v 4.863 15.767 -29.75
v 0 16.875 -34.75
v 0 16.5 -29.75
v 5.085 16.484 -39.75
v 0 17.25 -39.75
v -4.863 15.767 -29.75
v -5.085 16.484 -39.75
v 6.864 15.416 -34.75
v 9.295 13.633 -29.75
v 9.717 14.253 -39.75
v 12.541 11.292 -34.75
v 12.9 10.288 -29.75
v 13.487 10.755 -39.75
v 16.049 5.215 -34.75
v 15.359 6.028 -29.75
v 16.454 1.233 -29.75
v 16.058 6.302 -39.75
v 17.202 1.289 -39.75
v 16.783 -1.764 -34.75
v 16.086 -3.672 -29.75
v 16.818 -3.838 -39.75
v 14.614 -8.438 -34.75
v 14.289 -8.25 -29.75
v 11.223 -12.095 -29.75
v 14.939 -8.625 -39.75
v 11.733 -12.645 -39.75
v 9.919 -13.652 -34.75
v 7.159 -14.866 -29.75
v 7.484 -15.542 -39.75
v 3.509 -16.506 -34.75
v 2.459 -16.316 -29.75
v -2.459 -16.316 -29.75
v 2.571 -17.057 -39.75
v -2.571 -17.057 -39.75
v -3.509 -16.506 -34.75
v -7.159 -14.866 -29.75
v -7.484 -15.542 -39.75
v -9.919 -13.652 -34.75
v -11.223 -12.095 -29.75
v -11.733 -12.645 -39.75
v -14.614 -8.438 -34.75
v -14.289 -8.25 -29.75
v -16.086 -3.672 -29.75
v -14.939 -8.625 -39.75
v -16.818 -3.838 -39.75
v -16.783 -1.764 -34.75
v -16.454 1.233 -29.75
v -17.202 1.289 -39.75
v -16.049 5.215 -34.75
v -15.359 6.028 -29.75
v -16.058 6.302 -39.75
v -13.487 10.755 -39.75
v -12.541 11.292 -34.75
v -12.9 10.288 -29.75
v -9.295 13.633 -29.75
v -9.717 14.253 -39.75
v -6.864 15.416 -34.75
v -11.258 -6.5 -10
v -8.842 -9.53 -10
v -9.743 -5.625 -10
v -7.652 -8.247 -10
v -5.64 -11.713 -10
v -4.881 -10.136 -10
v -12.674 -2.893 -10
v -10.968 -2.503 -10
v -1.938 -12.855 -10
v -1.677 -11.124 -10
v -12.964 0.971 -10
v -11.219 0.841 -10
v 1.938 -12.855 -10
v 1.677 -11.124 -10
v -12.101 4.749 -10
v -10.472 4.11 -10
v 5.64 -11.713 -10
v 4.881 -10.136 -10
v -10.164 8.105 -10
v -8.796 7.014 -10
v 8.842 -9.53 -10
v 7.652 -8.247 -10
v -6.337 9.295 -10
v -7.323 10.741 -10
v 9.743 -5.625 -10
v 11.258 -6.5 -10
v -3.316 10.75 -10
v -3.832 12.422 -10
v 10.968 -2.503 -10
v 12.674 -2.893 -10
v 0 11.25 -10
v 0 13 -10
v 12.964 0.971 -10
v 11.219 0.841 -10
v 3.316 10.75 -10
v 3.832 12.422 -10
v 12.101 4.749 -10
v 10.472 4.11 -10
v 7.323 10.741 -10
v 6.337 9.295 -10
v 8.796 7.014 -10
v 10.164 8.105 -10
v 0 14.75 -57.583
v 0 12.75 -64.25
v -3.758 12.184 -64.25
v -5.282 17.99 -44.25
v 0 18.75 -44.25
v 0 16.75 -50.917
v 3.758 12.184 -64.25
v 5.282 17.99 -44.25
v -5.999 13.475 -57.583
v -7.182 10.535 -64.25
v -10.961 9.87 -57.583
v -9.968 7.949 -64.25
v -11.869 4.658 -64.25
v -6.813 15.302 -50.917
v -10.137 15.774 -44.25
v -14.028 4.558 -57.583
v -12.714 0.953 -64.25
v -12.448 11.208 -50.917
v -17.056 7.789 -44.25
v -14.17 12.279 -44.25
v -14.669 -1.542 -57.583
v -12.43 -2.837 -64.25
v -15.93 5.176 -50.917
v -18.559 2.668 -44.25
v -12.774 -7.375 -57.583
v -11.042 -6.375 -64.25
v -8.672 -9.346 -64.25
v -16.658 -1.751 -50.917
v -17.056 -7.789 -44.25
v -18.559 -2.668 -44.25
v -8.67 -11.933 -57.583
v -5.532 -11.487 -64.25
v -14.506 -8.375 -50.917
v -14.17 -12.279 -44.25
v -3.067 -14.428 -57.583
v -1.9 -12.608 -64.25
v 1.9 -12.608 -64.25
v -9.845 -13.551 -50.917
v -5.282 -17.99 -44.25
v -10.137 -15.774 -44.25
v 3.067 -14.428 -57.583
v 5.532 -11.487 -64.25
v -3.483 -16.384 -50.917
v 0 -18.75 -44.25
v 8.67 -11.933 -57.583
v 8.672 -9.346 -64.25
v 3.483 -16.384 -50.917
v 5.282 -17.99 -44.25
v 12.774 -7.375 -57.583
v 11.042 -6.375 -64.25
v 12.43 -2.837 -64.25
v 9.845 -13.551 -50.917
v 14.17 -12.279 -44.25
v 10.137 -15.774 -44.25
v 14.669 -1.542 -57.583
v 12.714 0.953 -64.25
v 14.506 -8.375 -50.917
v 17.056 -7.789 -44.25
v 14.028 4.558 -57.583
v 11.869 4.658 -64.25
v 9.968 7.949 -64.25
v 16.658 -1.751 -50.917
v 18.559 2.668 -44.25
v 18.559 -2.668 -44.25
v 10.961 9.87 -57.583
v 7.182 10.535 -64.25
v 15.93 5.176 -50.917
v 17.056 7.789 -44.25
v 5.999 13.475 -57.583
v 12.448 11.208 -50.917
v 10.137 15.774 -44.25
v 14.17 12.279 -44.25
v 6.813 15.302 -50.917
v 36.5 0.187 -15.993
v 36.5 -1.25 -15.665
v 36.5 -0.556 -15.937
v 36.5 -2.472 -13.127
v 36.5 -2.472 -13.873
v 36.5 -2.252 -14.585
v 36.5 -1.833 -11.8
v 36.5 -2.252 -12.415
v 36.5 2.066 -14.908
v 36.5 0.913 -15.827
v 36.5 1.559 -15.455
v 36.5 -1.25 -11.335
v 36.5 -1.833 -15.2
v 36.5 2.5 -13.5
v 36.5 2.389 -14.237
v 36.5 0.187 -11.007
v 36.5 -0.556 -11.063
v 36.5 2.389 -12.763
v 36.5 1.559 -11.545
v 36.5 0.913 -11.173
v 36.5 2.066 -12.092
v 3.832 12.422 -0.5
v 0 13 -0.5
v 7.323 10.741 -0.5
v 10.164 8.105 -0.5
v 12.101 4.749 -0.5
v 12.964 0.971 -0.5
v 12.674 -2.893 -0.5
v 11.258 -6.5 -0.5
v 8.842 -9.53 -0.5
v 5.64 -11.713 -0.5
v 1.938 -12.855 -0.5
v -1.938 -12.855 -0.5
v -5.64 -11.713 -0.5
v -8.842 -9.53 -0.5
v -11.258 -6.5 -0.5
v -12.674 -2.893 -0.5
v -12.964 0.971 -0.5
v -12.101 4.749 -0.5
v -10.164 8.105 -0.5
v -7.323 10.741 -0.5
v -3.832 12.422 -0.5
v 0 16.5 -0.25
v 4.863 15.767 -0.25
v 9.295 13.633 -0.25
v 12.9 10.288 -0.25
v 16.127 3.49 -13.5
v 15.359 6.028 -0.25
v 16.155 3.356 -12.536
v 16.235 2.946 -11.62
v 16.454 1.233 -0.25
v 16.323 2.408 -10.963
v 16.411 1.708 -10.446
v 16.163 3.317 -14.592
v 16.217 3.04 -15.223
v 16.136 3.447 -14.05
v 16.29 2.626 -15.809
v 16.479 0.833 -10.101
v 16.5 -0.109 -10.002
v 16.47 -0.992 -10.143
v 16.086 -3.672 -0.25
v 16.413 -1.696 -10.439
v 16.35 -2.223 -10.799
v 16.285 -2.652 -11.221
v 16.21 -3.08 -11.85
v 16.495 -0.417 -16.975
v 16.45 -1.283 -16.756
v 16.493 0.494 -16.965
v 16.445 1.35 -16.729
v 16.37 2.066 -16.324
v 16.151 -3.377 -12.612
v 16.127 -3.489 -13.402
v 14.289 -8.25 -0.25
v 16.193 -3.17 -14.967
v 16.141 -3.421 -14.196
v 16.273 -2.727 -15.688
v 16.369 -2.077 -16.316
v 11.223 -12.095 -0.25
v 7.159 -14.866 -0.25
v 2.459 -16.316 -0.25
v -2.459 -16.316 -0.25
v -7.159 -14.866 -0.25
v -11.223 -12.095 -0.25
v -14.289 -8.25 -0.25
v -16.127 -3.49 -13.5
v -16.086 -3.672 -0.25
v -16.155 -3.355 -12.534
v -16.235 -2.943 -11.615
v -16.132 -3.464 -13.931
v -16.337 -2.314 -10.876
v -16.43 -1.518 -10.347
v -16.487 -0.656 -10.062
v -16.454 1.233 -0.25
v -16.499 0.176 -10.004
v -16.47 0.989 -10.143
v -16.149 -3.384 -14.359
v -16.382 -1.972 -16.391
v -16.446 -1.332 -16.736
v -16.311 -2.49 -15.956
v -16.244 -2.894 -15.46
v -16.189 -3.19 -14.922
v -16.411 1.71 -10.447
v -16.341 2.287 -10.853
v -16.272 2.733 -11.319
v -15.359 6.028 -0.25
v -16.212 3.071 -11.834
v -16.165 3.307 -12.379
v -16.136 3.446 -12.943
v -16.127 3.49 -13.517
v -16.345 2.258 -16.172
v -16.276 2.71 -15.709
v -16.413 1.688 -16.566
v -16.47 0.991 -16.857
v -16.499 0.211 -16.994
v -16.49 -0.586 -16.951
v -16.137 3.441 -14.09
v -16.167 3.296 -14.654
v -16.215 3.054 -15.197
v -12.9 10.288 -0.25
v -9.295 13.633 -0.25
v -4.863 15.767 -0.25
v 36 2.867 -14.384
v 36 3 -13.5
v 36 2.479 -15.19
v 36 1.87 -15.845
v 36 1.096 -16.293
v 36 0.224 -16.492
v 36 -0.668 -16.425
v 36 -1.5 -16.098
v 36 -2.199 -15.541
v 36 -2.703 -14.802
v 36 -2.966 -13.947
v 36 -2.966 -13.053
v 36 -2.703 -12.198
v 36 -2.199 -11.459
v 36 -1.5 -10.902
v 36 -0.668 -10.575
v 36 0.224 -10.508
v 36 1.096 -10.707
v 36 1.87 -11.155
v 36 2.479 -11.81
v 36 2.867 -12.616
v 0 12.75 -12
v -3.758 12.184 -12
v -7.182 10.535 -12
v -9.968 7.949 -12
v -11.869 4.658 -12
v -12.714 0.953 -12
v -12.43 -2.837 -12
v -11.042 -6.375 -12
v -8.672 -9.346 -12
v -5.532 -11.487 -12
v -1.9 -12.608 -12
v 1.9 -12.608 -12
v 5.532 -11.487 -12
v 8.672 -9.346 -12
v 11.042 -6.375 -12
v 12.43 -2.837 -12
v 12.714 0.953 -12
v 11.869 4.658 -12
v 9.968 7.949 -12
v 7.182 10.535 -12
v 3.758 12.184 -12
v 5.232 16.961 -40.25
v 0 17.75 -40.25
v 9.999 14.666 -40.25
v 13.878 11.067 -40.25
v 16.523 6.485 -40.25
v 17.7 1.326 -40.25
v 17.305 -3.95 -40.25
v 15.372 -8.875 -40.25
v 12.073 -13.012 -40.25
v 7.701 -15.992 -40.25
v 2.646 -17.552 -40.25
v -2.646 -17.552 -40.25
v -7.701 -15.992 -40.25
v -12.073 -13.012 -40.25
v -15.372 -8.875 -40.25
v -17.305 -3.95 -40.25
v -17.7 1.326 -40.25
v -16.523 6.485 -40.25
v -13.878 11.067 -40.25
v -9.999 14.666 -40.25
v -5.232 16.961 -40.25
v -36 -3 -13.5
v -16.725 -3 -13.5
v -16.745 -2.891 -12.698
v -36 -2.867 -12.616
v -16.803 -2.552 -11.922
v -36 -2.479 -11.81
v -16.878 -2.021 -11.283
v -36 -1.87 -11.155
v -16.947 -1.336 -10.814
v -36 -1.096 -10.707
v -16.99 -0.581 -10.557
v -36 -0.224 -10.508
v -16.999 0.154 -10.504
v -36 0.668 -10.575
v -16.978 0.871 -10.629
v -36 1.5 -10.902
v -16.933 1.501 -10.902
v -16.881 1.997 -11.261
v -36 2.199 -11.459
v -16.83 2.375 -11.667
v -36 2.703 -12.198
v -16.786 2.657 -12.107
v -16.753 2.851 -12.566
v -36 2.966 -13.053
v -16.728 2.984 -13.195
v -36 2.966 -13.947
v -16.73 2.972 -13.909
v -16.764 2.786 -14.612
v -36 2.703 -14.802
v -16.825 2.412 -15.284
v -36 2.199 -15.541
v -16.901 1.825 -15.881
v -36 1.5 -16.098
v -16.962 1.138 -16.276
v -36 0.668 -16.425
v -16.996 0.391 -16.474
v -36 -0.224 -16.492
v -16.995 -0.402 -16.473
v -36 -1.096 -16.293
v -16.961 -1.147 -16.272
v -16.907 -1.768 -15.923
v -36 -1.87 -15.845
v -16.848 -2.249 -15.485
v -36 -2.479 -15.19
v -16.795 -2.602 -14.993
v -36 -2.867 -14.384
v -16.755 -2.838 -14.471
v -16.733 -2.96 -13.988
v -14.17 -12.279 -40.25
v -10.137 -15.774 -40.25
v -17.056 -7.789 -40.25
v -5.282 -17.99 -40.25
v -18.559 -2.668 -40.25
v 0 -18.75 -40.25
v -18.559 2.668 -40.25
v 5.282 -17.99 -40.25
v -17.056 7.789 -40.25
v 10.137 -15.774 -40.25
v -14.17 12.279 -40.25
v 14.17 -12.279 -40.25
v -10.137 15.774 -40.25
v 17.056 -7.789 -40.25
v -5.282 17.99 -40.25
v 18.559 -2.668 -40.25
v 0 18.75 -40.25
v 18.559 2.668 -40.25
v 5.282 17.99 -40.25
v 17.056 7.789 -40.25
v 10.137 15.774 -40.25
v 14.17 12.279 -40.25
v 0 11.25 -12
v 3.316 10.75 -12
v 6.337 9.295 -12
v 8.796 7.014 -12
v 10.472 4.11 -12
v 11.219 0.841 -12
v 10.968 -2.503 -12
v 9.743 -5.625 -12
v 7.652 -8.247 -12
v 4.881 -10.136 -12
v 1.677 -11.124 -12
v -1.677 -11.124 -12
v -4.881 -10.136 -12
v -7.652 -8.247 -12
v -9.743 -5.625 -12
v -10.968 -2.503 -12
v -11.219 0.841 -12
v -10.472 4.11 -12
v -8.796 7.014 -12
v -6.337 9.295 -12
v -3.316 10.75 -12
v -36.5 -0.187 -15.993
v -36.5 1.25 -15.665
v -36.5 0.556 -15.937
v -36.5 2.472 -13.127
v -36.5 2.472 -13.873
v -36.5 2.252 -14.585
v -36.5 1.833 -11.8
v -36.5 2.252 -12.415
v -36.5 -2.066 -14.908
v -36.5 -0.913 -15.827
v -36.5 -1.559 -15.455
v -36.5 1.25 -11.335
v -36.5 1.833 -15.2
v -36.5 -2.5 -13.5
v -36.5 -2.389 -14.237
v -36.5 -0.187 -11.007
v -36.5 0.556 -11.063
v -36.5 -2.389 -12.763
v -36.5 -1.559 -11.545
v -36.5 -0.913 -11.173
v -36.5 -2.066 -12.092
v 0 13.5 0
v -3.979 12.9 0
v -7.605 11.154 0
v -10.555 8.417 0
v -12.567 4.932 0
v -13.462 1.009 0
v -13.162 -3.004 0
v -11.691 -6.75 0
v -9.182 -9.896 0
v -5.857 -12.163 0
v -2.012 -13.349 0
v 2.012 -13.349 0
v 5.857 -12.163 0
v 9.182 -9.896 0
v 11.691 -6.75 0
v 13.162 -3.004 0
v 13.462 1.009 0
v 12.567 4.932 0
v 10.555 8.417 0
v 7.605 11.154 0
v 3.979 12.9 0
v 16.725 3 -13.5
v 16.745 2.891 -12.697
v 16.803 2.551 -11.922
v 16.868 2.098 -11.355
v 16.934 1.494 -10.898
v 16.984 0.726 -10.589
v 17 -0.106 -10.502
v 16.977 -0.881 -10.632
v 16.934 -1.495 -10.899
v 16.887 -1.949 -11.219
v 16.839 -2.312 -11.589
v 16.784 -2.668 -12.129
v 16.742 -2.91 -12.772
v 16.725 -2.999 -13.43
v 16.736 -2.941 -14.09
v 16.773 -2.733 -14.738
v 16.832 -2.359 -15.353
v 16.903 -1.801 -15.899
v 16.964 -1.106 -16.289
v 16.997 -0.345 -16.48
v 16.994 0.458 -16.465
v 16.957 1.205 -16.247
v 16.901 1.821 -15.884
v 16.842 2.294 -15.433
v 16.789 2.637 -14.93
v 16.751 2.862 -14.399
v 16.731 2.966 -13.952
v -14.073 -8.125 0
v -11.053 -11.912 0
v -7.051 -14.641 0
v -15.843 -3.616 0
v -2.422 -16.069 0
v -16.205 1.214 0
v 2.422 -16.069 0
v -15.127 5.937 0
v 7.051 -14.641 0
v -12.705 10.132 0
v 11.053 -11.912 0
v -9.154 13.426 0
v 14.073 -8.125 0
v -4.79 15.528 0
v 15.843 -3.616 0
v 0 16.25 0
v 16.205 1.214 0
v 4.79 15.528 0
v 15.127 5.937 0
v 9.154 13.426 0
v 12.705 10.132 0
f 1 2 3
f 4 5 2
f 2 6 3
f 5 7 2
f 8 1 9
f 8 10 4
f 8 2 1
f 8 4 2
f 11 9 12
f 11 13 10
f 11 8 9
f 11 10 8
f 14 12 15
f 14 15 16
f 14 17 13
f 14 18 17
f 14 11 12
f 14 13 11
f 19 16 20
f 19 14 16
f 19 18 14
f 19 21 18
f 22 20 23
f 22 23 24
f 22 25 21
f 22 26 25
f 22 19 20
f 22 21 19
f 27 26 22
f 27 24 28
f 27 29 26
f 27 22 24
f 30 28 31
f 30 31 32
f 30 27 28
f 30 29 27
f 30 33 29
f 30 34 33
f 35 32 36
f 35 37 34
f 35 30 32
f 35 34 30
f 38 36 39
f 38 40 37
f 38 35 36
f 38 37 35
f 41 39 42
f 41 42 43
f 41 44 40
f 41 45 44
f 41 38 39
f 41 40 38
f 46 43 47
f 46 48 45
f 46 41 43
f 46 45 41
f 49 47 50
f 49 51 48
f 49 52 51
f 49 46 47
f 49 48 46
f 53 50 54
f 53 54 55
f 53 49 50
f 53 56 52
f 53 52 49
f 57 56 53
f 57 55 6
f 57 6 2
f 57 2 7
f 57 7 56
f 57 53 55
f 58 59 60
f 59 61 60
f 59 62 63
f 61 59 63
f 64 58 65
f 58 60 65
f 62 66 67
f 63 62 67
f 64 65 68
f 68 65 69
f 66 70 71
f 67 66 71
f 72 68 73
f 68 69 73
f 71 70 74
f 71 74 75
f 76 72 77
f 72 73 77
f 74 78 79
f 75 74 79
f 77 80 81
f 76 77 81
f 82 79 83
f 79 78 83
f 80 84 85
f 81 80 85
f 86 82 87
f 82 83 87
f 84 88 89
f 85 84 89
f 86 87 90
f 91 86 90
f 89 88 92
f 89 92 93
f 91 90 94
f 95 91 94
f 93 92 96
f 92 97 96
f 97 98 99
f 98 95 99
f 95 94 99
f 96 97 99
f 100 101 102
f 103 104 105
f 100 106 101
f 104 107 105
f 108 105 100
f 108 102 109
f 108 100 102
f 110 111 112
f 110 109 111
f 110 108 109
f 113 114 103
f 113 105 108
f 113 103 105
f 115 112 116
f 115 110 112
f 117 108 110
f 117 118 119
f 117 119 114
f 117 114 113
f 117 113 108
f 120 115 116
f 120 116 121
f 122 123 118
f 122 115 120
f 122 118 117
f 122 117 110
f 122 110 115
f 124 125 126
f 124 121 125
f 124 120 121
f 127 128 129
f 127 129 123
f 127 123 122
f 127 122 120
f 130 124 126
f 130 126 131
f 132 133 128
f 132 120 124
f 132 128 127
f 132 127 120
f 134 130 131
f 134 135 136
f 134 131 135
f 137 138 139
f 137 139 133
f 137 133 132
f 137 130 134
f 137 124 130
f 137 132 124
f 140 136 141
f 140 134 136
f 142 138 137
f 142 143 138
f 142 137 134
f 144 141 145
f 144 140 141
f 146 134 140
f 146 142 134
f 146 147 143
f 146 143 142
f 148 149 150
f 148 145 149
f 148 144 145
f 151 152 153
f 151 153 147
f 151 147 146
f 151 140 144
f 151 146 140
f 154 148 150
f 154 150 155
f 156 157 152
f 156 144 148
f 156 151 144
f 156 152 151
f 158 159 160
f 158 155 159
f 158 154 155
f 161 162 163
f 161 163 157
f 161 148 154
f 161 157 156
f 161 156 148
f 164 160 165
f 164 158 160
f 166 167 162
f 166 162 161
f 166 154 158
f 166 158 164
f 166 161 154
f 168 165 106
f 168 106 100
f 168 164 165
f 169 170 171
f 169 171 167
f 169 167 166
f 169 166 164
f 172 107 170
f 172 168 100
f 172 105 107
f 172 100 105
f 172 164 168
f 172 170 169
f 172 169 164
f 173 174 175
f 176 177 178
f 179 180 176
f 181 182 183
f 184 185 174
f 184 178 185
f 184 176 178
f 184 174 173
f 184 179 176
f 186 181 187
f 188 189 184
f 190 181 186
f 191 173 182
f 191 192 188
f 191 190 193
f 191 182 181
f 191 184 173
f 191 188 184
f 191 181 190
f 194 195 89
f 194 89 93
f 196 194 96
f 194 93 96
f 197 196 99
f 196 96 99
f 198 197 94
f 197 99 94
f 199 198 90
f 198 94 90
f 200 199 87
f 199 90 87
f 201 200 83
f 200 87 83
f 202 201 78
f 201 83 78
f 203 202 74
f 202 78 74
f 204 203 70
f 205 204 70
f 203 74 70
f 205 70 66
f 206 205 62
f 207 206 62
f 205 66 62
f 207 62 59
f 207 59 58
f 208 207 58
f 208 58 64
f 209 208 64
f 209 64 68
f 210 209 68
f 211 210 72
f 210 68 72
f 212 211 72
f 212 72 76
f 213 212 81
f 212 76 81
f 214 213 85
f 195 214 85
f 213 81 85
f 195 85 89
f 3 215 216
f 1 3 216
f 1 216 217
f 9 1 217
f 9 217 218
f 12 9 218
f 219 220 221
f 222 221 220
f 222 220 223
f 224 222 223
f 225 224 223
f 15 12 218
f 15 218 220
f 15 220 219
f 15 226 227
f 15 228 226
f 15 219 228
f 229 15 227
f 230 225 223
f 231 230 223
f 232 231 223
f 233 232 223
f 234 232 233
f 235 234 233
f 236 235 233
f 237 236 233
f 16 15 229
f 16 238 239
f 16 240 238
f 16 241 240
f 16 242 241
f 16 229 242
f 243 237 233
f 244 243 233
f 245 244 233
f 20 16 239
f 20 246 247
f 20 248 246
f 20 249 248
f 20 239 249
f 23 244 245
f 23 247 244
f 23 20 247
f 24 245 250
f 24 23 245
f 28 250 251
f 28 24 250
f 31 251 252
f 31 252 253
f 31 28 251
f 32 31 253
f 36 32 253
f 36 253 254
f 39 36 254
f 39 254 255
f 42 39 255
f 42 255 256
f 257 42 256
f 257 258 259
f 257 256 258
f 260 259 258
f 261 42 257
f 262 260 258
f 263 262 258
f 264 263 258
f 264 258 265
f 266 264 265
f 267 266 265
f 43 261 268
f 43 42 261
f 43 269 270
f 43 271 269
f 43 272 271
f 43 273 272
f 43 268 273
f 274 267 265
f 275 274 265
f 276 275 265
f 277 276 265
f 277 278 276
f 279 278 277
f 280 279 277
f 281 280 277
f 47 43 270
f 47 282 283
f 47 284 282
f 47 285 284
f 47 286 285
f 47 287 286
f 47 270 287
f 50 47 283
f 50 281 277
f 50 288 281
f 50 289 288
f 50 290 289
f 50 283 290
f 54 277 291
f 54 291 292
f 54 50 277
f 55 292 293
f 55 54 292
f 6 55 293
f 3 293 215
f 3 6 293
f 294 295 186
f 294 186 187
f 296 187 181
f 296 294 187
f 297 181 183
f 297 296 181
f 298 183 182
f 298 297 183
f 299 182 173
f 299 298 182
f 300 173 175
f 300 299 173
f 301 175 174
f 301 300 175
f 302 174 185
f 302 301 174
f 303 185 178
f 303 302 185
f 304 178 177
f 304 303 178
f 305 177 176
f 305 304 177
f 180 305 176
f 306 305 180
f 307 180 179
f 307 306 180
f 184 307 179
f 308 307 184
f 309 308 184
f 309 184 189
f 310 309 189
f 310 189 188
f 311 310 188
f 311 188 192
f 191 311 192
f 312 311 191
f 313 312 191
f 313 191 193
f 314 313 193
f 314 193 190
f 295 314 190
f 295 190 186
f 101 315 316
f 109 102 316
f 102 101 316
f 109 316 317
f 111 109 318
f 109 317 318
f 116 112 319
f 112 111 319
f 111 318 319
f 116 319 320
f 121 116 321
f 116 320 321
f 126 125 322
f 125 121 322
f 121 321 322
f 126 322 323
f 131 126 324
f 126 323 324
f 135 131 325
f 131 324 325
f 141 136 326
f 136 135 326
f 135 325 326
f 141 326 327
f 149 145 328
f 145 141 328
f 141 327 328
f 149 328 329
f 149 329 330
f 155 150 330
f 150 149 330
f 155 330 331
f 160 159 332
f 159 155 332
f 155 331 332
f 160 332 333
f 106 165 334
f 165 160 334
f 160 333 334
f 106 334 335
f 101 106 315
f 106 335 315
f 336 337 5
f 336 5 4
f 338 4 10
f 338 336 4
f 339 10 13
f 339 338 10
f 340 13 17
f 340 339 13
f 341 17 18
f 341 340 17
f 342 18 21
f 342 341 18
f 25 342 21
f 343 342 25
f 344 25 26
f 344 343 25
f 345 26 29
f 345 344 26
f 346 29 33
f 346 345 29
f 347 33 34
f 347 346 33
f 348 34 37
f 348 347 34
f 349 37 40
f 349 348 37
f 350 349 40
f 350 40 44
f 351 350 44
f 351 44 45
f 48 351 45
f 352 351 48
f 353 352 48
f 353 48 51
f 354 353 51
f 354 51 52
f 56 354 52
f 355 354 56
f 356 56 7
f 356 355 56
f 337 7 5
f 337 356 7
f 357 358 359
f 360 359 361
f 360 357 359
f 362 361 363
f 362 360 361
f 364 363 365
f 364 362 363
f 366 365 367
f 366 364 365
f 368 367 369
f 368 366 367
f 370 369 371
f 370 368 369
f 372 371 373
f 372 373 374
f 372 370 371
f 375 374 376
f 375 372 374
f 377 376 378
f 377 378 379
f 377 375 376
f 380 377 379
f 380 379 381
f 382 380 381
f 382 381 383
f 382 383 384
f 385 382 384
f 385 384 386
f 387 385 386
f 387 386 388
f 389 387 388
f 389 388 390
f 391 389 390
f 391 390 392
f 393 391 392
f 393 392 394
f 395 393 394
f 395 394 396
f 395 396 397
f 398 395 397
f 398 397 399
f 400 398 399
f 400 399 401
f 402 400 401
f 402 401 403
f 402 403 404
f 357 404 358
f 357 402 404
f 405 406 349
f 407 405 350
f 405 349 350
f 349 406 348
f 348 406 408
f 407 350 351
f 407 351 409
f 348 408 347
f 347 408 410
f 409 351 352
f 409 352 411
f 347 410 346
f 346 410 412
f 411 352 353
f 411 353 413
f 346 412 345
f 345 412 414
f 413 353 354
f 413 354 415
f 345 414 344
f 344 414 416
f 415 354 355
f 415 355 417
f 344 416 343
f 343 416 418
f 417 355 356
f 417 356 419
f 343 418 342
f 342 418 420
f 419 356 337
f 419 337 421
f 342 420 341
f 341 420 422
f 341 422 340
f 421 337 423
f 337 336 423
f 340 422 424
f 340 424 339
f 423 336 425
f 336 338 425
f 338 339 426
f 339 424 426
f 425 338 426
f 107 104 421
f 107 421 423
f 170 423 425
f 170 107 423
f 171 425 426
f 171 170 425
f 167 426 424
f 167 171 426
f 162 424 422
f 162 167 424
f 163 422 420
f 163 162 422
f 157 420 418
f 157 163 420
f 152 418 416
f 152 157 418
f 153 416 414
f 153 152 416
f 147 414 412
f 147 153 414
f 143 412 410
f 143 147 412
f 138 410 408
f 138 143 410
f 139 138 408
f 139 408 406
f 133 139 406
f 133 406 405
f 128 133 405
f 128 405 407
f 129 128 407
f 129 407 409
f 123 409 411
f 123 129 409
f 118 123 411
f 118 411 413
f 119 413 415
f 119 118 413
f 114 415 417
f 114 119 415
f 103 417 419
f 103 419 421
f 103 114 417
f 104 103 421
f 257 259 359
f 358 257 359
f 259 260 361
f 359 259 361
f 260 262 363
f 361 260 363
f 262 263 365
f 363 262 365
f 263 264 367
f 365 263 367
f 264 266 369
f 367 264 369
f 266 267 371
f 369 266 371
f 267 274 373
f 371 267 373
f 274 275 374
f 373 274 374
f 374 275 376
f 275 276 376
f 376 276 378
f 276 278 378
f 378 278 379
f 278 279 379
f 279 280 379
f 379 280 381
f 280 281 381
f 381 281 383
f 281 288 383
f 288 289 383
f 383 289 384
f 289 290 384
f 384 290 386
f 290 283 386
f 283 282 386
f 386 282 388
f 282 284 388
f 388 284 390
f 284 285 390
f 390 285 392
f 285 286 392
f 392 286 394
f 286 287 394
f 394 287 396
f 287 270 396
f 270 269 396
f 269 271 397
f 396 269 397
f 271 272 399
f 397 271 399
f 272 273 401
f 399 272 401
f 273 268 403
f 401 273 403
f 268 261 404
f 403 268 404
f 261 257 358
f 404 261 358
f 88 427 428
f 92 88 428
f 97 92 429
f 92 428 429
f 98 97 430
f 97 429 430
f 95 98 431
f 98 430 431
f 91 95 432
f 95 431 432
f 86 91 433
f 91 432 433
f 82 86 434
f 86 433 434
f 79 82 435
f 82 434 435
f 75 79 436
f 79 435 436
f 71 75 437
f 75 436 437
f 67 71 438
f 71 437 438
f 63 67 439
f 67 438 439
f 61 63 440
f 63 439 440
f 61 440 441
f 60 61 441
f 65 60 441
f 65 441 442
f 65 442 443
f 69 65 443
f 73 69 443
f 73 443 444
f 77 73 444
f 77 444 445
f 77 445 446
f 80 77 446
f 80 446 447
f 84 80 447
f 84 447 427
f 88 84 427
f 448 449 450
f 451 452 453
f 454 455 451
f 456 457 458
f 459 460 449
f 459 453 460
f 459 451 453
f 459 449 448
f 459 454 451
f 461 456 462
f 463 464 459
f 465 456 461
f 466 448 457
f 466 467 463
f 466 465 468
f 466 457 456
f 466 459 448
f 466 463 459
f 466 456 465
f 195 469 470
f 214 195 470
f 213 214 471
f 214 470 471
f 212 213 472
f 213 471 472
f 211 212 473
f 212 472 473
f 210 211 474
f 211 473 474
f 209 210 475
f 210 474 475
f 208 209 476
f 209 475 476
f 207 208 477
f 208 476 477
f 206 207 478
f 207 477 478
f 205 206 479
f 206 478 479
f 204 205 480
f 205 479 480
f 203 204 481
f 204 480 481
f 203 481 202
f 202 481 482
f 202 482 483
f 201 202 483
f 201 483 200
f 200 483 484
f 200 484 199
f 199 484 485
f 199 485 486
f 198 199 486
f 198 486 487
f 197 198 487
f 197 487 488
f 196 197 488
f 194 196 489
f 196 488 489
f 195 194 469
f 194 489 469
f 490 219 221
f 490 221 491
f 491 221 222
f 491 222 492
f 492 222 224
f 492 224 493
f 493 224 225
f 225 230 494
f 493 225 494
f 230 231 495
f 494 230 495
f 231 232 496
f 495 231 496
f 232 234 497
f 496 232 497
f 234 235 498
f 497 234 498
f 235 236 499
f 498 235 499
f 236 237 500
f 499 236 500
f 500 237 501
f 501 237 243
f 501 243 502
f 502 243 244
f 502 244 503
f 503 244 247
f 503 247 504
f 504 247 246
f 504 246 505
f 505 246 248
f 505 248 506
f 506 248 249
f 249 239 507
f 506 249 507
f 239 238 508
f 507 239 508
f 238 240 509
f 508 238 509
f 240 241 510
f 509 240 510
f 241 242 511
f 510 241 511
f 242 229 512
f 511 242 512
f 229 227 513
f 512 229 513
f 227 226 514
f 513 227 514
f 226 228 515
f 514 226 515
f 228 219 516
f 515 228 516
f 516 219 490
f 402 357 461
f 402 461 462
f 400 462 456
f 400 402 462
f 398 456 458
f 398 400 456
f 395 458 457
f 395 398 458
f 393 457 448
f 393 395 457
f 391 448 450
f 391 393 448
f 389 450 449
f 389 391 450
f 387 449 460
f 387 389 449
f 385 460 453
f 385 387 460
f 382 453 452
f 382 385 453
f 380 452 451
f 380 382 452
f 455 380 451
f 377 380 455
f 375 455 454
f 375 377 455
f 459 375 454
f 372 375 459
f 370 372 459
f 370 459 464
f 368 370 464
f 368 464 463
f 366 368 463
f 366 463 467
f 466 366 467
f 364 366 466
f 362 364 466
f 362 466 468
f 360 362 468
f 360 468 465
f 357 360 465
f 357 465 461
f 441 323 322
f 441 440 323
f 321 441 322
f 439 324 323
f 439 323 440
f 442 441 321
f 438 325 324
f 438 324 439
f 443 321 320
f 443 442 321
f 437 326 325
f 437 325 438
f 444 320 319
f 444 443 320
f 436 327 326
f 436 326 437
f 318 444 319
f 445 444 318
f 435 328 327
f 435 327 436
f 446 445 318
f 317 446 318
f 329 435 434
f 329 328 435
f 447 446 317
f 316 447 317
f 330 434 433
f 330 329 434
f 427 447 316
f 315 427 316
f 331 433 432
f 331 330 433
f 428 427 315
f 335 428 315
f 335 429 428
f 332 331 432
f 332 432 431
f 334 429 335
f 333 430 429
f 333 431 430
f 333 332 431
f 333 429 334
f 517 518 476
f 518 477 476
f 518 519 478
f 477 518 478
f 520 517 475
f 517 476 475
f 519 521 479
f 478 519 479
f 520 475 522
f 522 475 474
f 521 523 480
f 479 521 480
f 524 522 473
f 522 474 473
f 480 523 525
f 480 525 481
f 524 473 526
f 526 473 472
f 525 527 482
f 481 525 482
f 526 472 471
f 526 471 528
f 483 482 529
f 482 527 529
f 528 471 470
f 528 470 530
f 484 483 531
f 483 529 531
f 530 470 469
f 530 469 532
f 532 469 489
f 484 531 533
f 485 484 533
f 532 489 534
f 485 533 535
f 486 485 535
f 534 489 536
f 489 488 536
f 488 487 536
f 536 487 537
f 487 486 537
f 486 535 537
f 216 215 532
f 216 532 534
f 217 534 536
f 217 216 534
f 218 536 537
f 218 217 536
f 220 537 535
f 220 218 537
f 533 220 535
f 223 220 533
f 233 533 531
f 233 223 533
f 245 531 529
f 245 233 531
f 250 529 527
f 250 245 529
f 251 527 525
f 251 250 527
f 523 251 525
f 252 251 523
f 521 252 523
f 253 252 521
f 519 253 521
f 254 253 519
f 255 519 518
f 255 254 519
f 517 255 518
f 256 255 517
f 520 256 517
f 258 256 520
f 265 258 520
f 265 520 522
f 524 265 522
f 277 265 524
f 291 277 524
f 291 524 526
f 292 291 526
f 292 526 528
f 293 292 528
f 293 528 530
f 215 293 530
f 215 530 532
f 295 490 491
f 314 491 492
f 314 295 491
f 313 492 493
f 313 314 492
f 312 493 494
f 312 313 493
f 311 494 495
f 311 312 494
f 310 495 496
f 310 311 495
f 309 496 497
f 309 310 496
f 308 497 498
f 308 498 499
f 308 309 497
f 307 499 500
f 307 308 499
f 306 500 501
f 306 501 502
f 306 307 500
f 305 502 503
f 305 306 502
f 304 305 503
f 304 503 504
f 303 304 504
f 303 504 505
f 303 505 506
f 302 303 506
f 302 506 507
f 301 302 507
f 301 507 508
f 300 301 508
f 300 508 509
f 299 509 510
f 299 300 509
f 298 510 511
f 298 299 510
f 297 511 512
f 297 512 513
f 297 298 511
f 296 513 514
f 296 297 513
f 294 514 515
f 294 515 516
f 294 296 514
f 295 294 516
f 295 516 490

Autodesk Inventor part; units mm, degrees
ref_plane "XZ Plane" through (0, 0, 0) normal (0, 1, 0) x (-1, 0, 0)
ref_plane "XY Plane" through (0, 0, 0) normal (0, 0, 1) x (1, 0, 0)
sketch "Esquisse1" plane through (0, 0, 0) normal (1, 0, 0) x (0, 1, 0)
  line L0 (0, 0) -> (0, -16.8642)
  line L1 (12.75, -0.5) -> (12.75, -10) construction
  line L2 (13, -0.5) -> (13, -10)
  line L3 (13.5, 0) -> (16.25, 0)
  line L4 (16.25, 0) -> (16.5, -0.25)
  line L5 (16.5, -0.25) -> (16.5, -29.75)
  line L6 (12.75, -64.25) -> (12.75, -12)
  line L7 (13, -10) -> (11.25, -10)
  line L8 (12.75, -12) -> (11.25, -12)
  line L9 (11.25, -10) -> (11.25, -12)
  line L10 (11, -10) -> (11, -12) construction
  line L11 (13.5, 0) -> (13, -0.5)
  line L12 (12.5, -12) -> (12.5, -64.25) construction
  line L13 (12.5, -0.5) -> (12.5, -10) construction
  line L14 (16.5, -29.75) -> (17.25, -39.75)
  line L15 (17.25, -39.75) -> (17.75, -40.25)
  line L16 (17.75, -40.25) -> (18.75, -40.25)
  line L17 (18.75, -40.25) -> (18.75, -44.25)
  line L18 (18.75, -44.25) -> (12.75, -64.25)
  dimension "d2" = 0.25
  dimension "d3" = 0.25
  dimension "d8" = 33
  dimension "d9" = 0.25
  dimension "d13" = 0.25
  dimension "d14" = 22
  dimension "d15" = 10
  dimension "d16" = 0.5
  dimension "d17" = 0.5
  dimension "d18" = 25
  dimension "d19" = 0.25
  dimension "d20" = 2
  dimension "d21" = 0.25
  dimension "d22" = 25
  dimension "d23" = 0.5
  dimension "d24" = 10
  dimension "d25" = 0.75
  dimension "d26" = 0.5
  dimension "d28" = 40.25
  dimension "d45" = 64.25
  dimension "d51" = 1
  dimension "d52" = 20
  dimension "d54" = 4
revolve "Révolution1" add sketch "Esquisse1" angle 360 about axis through (0, 0, 0) along (0, 0, -1)
ref_plane "Plan de construction1" through (16.5, 0, -15) normal (1, 0, 0) x (0, 1, 0)
sketch "Esquisse2" plane through (16.5, 0, -15) normal (1, 0, 0) x (0, 1, 0)
  circle A0 centre (0, 1.5) radius 3
  line L0 (0, -62.1) -> (0, 27.85) projected
  line L1 (-16.25, 15) -> (16.25, 15) projected
  point P0 (0, 15)
  dimension "d29" = 6
  dimension "d30" = 13.5
extrude "Extrusion1" add sketch "Esquisse2" along normal blind 20 and the other way blind 0.5
chamfer "Chanfrein1" distance 0.5 angle 45 4 edges at (36.5, -3, -13.5) (16.3413, 2.2832, -11.554) (16.225, -3, -13.4926) (16.3418, 2.2797, -15.4502)
pattern_circular "Réseau circulaire1" count 2 over 360 about axis through (0, 0, -10) along (0, 0, 1) of "Extrusion1", "Chanfrein1"
equation "\"d3\" = d2"
equation "\"d17\" = d16"
properties part number "canon_support_entree"
